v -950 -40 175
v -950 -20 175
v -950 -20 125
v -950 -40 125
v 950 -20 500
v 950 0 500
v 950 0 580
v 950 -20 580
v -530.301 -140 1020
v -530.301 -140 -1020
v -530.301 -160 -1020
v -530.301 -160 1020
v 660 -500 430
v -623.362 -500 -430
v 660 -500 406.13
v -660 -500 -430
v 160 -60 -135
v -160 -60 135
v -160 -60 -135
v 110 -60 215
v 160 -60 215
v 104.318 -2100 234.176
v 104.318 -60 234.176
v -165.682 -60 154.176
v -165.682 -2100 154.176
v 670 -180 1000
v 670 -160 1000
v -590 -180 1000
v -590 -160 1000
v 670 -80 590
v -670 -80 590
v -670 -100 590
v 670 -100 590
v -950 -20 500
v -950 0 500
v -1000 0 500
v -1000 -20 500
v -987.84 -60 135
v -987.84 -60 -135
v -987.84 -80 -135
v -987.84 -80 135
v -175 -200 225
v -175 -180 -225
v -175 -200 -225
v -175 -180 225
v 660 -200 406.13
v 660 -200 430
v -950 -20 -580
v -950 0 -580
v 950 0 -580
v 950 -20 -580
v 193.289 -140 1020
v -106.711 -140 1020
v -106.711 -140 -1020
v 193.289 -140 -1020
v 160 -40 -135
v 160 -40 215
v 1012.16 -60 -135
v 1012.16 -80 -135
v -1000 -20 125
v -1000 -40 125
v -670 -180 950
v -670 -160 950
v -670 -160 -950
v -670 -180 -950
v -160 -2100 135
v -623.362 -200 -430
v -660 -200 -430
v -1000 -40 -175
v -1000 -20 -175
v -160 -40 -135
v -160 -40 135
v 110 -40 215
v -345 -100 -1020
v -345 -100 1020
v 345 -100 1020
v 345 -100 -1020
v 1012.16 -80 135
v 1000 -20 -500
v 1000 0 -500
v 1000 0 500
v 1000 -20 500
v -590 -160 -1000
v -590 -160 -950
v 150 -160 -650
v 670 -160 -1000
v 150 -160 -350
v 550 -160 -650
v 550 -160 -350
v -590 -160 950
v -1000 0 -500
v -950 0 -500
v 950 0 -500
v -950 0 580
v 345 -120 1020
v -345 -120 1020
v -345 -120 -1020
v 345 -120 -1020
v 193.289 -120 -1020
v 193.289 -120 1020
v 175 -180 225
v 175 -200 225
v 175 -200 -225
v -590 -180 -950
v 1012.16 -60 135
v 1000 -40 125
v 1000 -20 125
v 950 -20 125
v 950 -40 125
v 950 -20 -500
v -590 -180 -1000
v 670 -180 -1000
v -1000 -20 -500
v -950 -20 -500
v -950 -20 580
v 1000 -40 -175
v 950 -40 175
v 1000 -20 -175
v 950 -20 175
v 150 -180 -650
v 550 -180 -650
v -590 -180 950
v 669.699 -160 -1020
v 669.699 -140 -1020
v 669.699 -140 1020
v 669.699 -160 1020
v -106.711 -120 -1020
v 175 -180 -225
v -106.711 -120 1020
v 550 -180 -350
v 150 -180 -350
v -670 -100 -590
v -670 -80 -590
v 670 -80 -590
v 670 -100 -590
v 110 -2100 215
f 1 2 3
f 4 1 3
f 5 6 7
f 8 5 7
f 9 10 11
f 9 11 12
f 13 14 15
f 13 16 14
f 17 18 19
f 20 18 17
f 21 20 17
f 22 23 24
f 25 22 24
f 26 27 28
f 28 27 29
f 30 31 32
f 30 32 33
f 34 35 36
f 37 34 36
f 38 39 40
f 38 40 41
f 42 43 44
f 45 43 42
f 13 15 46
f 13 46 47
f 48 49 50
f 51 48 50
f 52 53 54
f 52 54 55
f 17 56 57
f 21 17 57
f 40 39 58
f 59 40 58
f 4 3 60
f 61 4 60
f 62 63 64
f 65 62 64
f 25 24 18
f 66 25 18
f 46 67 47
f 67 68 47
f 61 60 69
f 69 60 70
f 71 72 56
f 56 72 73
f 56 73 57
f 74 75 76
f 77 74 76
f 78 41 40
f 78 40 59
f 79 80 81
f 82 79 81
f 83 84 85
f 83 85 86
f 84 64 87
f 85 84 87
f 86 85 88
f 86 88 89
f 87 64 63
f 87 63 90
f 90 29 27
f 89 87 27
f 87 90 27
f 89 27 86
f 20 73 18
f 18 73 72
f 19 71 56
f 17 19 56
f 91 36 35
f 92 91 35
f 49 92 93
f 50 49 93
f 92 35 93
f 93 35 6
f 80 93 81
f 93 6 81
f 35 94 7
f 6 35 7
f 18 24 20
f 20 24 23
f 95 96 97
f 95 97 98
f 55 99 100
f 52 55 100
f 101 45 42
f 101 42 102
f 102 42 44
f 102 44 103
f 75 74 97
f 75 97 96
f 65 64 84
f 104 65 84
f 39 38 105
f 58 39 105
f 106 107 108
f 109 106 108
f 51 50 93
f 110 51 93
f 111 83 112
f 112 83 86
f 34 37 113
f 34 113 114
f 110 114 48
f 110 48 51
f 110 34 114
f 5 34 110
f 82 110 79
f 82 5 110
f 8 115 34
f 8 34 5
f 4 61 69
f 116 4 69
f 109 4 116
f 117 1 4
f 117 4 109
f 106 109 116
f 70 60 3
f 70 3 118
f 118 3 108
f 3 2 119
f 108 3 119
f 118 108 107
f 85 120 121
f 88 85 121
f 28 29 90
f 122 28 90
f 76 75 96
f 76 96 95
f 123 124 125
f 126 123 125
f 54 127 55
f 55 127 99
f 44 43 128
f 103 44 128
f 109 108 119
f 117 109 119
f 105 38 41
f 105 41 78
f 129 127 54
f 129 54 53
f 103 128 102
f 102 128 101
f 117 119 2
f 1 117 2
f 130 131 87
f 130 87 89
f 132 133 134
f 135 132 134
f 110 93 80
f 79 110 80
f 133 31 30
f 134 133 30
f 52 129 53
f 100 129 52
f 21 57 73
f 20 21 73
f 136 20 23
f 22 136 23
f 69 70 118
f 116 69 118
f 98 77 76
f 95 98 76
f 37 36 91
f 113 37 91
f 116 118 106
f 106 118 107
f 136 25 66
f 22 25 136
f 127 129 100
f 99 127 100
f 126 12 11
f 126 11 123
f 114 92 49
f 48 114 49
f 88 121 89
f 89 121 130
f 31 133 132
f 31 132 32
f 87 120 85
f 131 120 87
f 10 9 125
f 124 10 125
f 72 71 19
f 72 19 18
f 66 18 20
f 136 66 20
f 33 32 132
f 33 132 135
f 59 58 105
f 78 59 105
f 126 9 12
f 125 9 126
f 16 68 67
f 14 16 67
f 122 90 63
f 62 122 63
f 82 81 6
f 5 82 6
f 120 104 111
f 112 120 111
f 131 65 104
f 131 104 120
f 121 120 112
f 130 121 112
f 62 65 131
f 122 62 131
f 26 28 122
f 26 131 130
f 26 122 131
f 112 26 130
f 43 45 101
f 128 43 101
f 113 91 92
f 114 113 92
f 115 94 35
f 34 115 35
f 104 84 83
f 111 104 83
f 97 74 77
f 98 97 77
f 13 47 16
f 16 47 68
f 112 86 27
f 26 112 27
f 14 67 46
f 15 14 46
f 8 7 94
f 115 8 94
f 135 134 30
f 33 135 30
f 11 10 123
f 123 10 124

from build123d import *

# Parameters (mm, degrees)
F1_DEPTH  = 20
F3_DEPTH  = 20
F4_W      = 320
F4_H      = 270
F5_DEPTH  = 20
F6_W      = 2000
F6_H      = 270
F7_DEPTH  = 20
F9_DEPTH  = 2040
F10_W     = 1340
F10_H     = 1180
F11_DEPTH = 20
F12_W     = 690
F12_H     = 2040
F13_DEPTH = 20
F14_W     = 300
F14_H     = 2040
F15_DEPTH = 20
F16_W     = 1200
F16_H     = 2040
F17_DEPTH = 20
F18_W     = 0.3014054894
F18_H     = 2000
F18_W_2   = 1200
F19_DEPTH = 20
F20_W     = 400
F20_H     = 300
F21_DEPTH = 25
F22_W     = 350
F22_H     = 450
F23_DEPTH = 20
F25_DEPTH = 300


with BuildPart() as f1:
    # F0 (on Front) → F1 (new body)
    with BuildSketch(Plane.XZ):
        Polygon((950, 500), (950, 580), (-950, 580), (-950, 500), (-1000, 500), (-1000, -500), (-950, -500), (-950, -580), (950, -580), (950, -500), (1000, -500), (1000, 500), align=None)
    extrude(amount=F1_DEPTH)


with BuildPart() as f3:
    # F2 (on face) → F3 (new body)
    with BuildSketch(Plane.XZ.offset(20)):
        Polygon((950, 125), (950, 175), (-950, 175), (-950, 125), (-1000, 125), (-1000, -175), (1000, -175), (1000, 125), align=None)
    extrude(amount=F3_DEPTH)


with BuildPart() as f5:
    # F4 (on face) → F5 (new body)
    with BuildSketch(Plane.XZ.offset(40)):
        Rectangle(F4_W, F4_H)
        Polygon((-160, 135), (160, 135), (160, 215), (110, 215), align=None)
    extrude(amount=F5_DEPTH)


with BuildPart() as f7:
    # F6 (on face) → F7 (new body)
    with BuildSketch(Plane.XZ.offset(60)):
        with Locations((12.1596539393, 0)):
            Rectangle(F6_W, F6_H)
    extrude(amount=F7_DEPTH)


with BuildPart() as f9:
    # F8 (on face) → F9 (new body)
    with BuildSketch(Plane.XZ.offset(60)):
        Polygon((-160, 135), (110, 215), (104.3182334062, 234.1759622542), (-165.6817665938, 154.1759622542), align=None)
    extrude(amount=F9_DEPTH)


with BuildPart() as f11:
    # F10 (on face) → F11 (new body)
    with BuildSketch(Plane.XZ.offset(80)):
        Rectangle(F10_W, F10_H)
    extrude(amount=F11_DEPTH)


with BuildPart() as f13:
    # F12 (on face) → F13 (new body)
    with BuildSketch(Plane.XZ.offset(100)):
        Rectangle(F12_W, F12_H)
    extrude(amount=F13_DEPTH)


with BuildPart() as f15:
    # F14 (on face) → F15 (new body)
    with BuildSketch(Plane.XZ.offset(120)):
        with Locations((43.2888381183, 0)):
            Rectangle(F14_W, F14_H)
    extrude(amount=F15_DEPTH)


with BuildPart() as f17:
    # F16 (on face) → F17 (new body)
    with BuildSketch(Plane.XZ.offset(140)):
        with Locations((69.6985945106, 0)):
            Rectangle(F16_W, F16_H)
    extrude(amount=F17_DEPTH)


with BuildPart() as f19:
    # F18 (on face) → F19 (new body)
    with BuildSketch(Plane.XZ.offset(160)):
        with Locations((669.8492972553, 0)):
            Rectangle(F18_W, F18_H)
        Polygon((-530.3014054894, 1000), (-590, 1000), (-590, 950), (-670, 950), (-670, -950), (-590, -950), (-590, -1000), (-530.3014054894, -1000), align=None)
        with Locations((69.6985945106, 0)):
            Rectangle(F18_W_2, F18_H)
    extrude(amount=F19_DEPTH)

    # F20 (on face) → F21 (cut)
    with BuildSketch(Plane.XZ.offset(180)):
        with Locations((350, -500)):
            Rectangle(F20_W, F20_H)
    extrude(amount=-F21_DEPTH, mode=Mode.SUBTRACT)


with BuildPart() as f23:
    # F22 (on face) → F23 (new body)
    with BuildSketch(Plane.XZ.offset(180)):
        Rectangle(F22_W, F22_H)
    extrude(amount=F23_DEPTH)


with BuildPart() as f25:
    # F24 (on face) → F25 (new body)
    with BuildSketch(Plane.XZ.offset(200)):
        Polygon((660, 430), (-660, -430), (-623.3619430822, -430), (660, 406.129750796), align=None)
    extrude(amount=F25_DEPTH)


solid = Compound([f1.part, f3.part, f5.part, f7.part, f9.part, f11.part, f13.part, f15.part, f17.part, f19.part, f23.part, f25.part])
